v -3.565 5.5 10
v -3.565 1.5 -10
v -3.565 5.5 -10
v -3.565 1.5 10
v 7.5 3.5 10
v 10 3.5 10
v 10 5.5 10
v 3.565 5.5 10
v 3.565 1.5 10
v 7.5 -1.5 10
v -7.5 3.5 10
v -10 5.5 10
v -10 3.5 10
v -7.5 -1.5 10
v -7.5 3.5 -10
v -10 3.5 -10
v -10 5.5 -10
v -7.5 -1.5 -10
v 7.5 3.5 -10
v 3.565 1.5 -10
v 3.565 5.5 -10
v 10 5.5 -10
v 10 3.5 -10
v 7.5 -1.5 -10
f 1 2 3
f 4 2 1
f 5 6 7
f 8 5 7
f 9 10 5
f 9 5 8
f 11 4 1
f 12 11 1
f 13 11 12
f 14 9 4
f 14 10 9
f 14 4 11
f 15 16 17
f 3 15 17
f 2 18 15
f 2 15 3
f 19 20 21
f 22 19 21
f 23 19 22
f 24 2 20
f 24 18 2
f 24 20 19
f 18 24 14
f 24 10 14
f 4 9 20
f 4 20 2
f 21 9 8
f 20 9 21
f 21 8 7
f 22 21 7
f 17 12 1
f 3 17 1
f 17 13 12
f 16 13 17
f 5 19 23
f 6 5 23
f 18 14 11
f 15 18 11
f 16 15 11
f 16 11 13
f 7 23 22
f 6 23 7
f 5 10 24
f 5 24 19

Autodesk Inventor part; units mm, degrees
ref_plane "YZ Plane" through (0, 0, 0) normal (1, 0, 0) x (0, 1, 0)
ref_plane "XZ Plane" through (0, 0, 0) normal (0, 1, 0) x (-1, 0, 0)
ref_plane "XY Plane" through (0, 0, 0) normal (0, 0, 1) x (1, 0, 0)
sketch "Sketch1" plane through (0, 0, 0) normal (0, 1, 0) x (-1, 0, 0)
  line L0 (-10, 10) -> (10, 10)
  line L1 (10, 10) -> (10, -10)
  line L2 (10, -10) -> (-10, -10)
  line L3 (-10, -10) -> (-10, 10)
  line L4 (-10, 10) -> (10, -10) construction
  line L5 (10, 10) -> (-10, -10) construction
  point P0 (0, 0)
  dimension "d0" = 20
  dimension "d1" = 20
extrude "Extrusion1" add sketch "Sketch1" along normal mid plane 3
sketch "Sketch2" plane through (0, 1.5, 0) normal (0, 1, 0) x (1, 0, 0)
  line L0 (-10, -10) -> (10, -10) projected
  line L1 (10, -10) -> (10, 10) projected
  line L2 (10, 10) -> (-10, 10) projected
  line L3 (-10, 10) -> (-10, -10) projected
  line L4 (-3.565, -10) -> (3.565, -10)
  line L5 (3.565, -10) -> (3.565, 10)
  line L6 (3.565, 10) -> (-3.565, 10)
  line L7 (-3.565, 10) -> (-3.565, -10)
  point P0 (0, 0)
  point P1 (0, 10)
  dimension "d5" = 7.13
extrude "Extrusion2" add sketch "Sketch2" along normal blind 4 contours L3 L2 L7 L0 | L5 L2 L1 L0
sketch "Sketch3" plane through (-10, -1.5, 10) normal (0, 0, 1) x (1, 0, 0)
  line L0 (0, 7) -> (0, 0) projected
  line L1 (2.5, 5) -> (0, 5)
  line L2 (0, 5) -> (0, 0)
  line L3 (0, 0) -> (2.5, 0)
  line L4 (2.5, 0) -> (2.5, 5)
  line L5 (2.5, 5) -> (0, 0) construction
  line L6 (0, 5) -> (2.5, 0) construction
  line L7 (20, 0) -> (0, 0) projected
  line L8 (17.5, 5) -> (20, 5)
  line L9 (20, 5) -> (20, 0)
  line L10 (20, 0) -> (17.5, 0)
  line L11 (17.5, 0) -> (17.5, 5)
  line L12 (17.5, 5) -> (20, 0) construction
  line L13 (20, 5) -> (17.5, 0) construction
  point P0 (10, 1.5)
  point P1 (1.25, 2.5)
  point P2 (18.75, 2.5)
  point P3 (1.25, 2.5)
  point P4 (18.75, 2.5)
  dimension "d8" = 2.5
  dimension "d9" = 5
extrude "Extrusion3" cut sketch "Sketch3" against normal through all
properties part number "RS-FixedFiber"
